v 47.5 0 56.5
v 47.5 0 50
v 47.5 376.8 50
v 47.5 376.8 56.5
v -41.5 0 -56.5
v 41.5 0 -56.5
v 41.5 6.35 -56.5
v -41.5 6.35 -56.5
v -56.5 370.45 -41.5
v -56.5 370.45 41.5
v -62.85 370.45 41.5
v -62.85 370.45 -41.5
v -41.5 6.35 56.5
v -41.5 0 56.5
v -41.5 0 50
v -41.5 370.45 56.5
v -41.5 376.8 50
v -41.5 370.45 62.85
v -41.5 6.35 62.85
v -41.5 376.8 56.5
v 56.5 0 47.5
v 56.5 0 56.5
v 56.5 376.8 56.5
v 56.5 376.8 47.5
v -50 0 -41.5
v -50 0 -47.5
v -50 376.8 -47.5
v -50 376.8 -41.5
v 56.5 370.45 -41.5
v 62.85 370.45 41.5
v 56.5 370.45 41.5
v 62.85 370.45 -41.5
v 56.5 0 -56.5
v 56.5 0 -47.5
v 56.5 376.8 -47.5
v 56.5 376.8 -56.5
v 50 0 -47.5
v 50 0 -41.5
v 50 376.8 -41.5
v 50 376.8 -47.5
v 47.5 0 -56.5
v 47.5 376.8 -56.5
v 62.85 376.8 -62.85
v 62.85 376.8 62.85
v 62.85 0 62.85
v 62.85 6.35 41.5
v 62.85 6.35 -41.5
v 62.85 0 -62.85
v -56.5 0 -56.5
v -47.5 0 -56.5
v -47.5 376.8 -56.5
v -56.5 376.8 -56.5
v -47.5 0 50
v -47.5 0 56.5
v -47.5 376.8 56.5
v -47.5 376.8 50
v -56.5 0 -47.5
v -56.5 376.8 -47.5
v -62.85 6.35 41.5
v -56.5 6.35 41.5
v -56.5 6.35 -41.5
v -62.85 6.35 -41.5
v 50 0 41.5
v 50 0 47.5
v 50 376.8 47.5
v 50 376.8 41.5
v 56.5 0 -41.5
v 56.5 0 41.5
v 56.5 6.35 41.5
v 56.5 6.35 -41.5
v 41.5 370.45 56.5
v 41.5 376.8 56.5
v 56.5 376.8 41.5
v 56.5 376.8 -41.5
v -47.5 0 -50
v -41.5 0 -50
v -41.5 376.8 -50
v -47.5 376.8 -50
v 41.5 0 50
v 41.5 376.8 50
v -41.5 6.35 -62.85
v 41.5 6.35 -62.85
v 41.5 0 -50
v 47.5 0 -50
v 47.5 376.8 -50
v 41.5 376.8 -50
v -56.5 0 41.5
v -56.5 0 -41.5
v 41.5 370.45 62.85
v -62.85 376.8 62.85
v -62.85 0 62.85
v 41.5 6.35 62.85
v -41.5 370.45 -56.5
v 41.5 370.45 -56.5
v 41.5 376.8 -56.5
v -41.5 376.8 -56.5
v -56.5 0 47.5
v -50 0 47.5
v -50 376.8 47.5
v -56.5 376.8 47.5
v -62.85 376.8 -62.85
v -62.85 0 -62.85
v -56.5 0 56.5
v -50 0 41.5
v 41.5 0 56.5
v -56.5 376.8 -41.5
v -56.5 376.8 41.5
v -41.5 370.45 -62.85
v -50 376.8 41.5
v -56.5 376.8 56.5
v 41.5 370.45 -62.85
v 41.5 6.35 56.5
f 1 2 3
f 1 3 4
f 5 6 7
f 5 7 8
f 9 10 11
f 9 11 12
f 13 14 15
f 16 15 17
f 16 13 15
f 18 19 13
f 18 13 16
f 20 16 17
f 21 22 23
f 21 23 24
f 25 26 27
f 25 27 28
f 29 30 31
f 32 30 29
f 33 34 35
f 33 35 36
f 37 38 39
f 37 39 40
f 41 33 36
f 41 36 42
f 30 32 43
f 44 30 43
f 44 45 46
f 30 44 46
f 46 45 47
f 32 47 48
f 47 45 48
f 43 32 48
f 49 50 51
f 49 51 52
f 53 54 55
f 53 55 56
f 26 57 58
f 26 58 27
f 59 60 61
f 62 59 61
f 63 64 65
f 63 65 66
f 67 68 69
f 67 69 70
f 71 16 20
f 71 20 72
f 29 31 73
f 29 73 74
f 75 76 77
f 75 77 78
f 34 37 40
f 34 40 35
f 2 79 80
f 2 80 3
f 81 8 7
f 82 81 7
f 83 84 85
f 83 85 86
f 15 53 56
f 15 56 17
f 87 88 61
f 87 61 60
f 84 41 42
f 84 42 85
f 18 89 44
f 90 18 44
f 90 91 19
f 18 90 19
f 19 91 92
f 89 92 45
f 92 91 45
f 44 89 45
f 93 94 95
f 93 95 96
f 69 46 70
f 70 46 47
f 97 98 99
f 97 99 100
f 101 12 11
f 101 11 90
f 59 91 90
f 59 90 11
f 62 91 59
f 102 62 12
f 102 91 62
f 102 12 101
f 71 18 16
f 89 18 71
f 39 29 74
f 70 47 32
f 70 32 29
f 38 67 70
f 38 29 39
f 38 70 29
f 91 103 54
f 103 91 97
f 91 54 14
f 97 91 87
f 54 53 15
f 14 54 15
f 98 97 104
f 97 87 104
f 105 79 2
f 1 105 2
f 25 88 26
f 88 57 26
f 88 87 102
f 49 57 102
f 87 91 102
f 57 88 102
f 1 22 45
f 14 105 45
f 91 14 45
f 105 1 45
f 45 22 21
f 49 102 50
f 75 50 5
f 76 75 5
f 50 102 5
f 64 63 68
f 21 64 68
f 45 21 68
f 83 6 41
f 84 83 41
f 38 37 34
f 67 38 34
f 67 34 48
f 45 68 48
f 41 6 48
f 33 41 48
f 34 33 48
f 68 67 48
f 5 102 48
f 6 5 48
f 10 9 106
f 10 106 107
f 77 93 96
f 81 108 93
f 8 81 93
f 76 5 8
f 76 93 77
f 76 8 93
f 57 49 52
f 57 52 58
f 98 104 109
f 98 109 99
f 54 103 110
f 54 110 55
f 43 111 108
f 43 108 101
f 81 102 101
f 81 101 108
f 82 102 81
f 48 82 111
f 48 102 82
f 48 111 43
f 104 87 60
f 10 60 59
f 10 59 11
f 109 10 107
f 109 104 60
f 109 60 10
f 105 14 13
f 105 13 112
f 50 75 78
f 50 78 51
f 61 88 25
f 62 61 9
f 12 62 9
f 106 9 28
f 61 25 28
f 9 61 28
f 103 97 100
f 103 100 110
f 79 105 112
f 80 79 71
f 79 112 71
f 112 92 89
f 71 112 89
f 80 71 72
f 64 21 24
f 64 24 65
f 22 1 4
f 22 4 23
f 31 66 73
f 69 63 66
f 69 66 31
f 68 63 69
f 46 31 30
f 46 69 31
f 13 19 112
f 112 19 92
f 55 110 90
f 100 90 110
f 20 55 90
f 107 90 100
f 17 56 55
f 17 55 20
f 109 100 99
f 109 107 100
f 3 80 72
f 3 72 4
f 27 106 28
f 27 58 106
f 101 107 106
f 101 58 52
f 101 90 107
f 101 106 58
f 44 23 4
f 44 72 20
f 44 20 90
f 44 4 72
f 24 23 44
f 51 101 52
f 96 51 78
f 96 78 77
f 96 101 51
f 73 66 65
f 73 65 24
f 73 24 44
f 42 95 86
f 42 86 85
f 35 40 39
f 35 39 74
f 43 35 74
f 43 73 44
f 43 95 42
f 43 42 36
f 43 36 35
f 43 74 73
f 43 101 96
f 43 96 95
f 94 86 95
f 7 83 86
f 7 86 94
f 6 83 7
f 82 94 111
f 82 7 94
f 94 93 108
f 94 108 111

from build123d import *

# Parameters (mm, degrees)
SKETCH1_W           = 125.7
SKETCH1_H           = 125.7
BOSS_EXTRUDE1_DEPTH = 376.8
SKETCH3_W           = 83
SKETCH3_H           = 364.1
CUT_EXTRUDE1_DEPTH  = 126.35
SKETCH5_W           = 83
SKETCH5_H           = 364.1
CUT_EXTRUDE2_DEPTH  = 126.35


with BuildPart() as part:
    # Sketch1 → Boss-Extrude1 (new body)
    with BuildSketch(Plane(origin=(0, 0, 0), x_dir=(1, 0, 0), z_dir=(0, 1, 0))):
        Rectangle(SKETCH1_W, SKETCH1_H)
        Polygon((-47.5, -56.5), (-47.5, -50), (-41.5, -50), (-41.5, -56.5), (41.5, -56.5), (41.5, -50), (47.5, -50), (47.5, -56.5), (56.5, -56.5), (56.5, -47.5), (50, -47.5), (50, -41.5), (56.5, -41.5), (56.5, 41.5), (50, 41.5), (50, 47.5), (56.5, 47.5), (56.5, 56.5), (47.5, 56.5), (47.5, 50), (41.5, 50), (41.5, 56.5), (-41.5, 56.5), (-41.5, 50), (-47.5, 50), (-47.5, 56.5), (-56.5, 56.5), (-56.5, 47.5), (-50, 47.5), (-50, 41.5), (-56.5, 41.5), (-56.5, -41.5), (-50, -41.5), (-50, -47.5), (-56.5, -47.5), (-56.5, -56.5), align=None, mode=Mode.SUBTRACT)
    extrude(amount=BOSS_EXTRUDE1_DEPTH)

    # Sketch3 → Cut-Extrude1 (cut)
    with BuildSketch(Plane(origin=(62.85, 0, 0), x_dir=(0, 0, -1), z_dir=(1, 0, 0))):
        with Locations((0, 188.4)):
            Rectangle(SKETCH3_W, SKETCH3_H)
    extrude(amount=-CUT_EXTRUDE1_DEPTH, mode=Mode.SUBTRACT)

    # Sketch5 → Cut-Extrude2 (cut)
    with BuildSketch(Plane.XY.offset(62.85)):
        with Locations((0, 188.4)):
            Rectangle(SKETCH5_W, SKETCH5_H)
    extrude(amount=-CUT_EXTRUDE2_DEPTH, mode=Mode.SUBTRACT)


solid = part.part
